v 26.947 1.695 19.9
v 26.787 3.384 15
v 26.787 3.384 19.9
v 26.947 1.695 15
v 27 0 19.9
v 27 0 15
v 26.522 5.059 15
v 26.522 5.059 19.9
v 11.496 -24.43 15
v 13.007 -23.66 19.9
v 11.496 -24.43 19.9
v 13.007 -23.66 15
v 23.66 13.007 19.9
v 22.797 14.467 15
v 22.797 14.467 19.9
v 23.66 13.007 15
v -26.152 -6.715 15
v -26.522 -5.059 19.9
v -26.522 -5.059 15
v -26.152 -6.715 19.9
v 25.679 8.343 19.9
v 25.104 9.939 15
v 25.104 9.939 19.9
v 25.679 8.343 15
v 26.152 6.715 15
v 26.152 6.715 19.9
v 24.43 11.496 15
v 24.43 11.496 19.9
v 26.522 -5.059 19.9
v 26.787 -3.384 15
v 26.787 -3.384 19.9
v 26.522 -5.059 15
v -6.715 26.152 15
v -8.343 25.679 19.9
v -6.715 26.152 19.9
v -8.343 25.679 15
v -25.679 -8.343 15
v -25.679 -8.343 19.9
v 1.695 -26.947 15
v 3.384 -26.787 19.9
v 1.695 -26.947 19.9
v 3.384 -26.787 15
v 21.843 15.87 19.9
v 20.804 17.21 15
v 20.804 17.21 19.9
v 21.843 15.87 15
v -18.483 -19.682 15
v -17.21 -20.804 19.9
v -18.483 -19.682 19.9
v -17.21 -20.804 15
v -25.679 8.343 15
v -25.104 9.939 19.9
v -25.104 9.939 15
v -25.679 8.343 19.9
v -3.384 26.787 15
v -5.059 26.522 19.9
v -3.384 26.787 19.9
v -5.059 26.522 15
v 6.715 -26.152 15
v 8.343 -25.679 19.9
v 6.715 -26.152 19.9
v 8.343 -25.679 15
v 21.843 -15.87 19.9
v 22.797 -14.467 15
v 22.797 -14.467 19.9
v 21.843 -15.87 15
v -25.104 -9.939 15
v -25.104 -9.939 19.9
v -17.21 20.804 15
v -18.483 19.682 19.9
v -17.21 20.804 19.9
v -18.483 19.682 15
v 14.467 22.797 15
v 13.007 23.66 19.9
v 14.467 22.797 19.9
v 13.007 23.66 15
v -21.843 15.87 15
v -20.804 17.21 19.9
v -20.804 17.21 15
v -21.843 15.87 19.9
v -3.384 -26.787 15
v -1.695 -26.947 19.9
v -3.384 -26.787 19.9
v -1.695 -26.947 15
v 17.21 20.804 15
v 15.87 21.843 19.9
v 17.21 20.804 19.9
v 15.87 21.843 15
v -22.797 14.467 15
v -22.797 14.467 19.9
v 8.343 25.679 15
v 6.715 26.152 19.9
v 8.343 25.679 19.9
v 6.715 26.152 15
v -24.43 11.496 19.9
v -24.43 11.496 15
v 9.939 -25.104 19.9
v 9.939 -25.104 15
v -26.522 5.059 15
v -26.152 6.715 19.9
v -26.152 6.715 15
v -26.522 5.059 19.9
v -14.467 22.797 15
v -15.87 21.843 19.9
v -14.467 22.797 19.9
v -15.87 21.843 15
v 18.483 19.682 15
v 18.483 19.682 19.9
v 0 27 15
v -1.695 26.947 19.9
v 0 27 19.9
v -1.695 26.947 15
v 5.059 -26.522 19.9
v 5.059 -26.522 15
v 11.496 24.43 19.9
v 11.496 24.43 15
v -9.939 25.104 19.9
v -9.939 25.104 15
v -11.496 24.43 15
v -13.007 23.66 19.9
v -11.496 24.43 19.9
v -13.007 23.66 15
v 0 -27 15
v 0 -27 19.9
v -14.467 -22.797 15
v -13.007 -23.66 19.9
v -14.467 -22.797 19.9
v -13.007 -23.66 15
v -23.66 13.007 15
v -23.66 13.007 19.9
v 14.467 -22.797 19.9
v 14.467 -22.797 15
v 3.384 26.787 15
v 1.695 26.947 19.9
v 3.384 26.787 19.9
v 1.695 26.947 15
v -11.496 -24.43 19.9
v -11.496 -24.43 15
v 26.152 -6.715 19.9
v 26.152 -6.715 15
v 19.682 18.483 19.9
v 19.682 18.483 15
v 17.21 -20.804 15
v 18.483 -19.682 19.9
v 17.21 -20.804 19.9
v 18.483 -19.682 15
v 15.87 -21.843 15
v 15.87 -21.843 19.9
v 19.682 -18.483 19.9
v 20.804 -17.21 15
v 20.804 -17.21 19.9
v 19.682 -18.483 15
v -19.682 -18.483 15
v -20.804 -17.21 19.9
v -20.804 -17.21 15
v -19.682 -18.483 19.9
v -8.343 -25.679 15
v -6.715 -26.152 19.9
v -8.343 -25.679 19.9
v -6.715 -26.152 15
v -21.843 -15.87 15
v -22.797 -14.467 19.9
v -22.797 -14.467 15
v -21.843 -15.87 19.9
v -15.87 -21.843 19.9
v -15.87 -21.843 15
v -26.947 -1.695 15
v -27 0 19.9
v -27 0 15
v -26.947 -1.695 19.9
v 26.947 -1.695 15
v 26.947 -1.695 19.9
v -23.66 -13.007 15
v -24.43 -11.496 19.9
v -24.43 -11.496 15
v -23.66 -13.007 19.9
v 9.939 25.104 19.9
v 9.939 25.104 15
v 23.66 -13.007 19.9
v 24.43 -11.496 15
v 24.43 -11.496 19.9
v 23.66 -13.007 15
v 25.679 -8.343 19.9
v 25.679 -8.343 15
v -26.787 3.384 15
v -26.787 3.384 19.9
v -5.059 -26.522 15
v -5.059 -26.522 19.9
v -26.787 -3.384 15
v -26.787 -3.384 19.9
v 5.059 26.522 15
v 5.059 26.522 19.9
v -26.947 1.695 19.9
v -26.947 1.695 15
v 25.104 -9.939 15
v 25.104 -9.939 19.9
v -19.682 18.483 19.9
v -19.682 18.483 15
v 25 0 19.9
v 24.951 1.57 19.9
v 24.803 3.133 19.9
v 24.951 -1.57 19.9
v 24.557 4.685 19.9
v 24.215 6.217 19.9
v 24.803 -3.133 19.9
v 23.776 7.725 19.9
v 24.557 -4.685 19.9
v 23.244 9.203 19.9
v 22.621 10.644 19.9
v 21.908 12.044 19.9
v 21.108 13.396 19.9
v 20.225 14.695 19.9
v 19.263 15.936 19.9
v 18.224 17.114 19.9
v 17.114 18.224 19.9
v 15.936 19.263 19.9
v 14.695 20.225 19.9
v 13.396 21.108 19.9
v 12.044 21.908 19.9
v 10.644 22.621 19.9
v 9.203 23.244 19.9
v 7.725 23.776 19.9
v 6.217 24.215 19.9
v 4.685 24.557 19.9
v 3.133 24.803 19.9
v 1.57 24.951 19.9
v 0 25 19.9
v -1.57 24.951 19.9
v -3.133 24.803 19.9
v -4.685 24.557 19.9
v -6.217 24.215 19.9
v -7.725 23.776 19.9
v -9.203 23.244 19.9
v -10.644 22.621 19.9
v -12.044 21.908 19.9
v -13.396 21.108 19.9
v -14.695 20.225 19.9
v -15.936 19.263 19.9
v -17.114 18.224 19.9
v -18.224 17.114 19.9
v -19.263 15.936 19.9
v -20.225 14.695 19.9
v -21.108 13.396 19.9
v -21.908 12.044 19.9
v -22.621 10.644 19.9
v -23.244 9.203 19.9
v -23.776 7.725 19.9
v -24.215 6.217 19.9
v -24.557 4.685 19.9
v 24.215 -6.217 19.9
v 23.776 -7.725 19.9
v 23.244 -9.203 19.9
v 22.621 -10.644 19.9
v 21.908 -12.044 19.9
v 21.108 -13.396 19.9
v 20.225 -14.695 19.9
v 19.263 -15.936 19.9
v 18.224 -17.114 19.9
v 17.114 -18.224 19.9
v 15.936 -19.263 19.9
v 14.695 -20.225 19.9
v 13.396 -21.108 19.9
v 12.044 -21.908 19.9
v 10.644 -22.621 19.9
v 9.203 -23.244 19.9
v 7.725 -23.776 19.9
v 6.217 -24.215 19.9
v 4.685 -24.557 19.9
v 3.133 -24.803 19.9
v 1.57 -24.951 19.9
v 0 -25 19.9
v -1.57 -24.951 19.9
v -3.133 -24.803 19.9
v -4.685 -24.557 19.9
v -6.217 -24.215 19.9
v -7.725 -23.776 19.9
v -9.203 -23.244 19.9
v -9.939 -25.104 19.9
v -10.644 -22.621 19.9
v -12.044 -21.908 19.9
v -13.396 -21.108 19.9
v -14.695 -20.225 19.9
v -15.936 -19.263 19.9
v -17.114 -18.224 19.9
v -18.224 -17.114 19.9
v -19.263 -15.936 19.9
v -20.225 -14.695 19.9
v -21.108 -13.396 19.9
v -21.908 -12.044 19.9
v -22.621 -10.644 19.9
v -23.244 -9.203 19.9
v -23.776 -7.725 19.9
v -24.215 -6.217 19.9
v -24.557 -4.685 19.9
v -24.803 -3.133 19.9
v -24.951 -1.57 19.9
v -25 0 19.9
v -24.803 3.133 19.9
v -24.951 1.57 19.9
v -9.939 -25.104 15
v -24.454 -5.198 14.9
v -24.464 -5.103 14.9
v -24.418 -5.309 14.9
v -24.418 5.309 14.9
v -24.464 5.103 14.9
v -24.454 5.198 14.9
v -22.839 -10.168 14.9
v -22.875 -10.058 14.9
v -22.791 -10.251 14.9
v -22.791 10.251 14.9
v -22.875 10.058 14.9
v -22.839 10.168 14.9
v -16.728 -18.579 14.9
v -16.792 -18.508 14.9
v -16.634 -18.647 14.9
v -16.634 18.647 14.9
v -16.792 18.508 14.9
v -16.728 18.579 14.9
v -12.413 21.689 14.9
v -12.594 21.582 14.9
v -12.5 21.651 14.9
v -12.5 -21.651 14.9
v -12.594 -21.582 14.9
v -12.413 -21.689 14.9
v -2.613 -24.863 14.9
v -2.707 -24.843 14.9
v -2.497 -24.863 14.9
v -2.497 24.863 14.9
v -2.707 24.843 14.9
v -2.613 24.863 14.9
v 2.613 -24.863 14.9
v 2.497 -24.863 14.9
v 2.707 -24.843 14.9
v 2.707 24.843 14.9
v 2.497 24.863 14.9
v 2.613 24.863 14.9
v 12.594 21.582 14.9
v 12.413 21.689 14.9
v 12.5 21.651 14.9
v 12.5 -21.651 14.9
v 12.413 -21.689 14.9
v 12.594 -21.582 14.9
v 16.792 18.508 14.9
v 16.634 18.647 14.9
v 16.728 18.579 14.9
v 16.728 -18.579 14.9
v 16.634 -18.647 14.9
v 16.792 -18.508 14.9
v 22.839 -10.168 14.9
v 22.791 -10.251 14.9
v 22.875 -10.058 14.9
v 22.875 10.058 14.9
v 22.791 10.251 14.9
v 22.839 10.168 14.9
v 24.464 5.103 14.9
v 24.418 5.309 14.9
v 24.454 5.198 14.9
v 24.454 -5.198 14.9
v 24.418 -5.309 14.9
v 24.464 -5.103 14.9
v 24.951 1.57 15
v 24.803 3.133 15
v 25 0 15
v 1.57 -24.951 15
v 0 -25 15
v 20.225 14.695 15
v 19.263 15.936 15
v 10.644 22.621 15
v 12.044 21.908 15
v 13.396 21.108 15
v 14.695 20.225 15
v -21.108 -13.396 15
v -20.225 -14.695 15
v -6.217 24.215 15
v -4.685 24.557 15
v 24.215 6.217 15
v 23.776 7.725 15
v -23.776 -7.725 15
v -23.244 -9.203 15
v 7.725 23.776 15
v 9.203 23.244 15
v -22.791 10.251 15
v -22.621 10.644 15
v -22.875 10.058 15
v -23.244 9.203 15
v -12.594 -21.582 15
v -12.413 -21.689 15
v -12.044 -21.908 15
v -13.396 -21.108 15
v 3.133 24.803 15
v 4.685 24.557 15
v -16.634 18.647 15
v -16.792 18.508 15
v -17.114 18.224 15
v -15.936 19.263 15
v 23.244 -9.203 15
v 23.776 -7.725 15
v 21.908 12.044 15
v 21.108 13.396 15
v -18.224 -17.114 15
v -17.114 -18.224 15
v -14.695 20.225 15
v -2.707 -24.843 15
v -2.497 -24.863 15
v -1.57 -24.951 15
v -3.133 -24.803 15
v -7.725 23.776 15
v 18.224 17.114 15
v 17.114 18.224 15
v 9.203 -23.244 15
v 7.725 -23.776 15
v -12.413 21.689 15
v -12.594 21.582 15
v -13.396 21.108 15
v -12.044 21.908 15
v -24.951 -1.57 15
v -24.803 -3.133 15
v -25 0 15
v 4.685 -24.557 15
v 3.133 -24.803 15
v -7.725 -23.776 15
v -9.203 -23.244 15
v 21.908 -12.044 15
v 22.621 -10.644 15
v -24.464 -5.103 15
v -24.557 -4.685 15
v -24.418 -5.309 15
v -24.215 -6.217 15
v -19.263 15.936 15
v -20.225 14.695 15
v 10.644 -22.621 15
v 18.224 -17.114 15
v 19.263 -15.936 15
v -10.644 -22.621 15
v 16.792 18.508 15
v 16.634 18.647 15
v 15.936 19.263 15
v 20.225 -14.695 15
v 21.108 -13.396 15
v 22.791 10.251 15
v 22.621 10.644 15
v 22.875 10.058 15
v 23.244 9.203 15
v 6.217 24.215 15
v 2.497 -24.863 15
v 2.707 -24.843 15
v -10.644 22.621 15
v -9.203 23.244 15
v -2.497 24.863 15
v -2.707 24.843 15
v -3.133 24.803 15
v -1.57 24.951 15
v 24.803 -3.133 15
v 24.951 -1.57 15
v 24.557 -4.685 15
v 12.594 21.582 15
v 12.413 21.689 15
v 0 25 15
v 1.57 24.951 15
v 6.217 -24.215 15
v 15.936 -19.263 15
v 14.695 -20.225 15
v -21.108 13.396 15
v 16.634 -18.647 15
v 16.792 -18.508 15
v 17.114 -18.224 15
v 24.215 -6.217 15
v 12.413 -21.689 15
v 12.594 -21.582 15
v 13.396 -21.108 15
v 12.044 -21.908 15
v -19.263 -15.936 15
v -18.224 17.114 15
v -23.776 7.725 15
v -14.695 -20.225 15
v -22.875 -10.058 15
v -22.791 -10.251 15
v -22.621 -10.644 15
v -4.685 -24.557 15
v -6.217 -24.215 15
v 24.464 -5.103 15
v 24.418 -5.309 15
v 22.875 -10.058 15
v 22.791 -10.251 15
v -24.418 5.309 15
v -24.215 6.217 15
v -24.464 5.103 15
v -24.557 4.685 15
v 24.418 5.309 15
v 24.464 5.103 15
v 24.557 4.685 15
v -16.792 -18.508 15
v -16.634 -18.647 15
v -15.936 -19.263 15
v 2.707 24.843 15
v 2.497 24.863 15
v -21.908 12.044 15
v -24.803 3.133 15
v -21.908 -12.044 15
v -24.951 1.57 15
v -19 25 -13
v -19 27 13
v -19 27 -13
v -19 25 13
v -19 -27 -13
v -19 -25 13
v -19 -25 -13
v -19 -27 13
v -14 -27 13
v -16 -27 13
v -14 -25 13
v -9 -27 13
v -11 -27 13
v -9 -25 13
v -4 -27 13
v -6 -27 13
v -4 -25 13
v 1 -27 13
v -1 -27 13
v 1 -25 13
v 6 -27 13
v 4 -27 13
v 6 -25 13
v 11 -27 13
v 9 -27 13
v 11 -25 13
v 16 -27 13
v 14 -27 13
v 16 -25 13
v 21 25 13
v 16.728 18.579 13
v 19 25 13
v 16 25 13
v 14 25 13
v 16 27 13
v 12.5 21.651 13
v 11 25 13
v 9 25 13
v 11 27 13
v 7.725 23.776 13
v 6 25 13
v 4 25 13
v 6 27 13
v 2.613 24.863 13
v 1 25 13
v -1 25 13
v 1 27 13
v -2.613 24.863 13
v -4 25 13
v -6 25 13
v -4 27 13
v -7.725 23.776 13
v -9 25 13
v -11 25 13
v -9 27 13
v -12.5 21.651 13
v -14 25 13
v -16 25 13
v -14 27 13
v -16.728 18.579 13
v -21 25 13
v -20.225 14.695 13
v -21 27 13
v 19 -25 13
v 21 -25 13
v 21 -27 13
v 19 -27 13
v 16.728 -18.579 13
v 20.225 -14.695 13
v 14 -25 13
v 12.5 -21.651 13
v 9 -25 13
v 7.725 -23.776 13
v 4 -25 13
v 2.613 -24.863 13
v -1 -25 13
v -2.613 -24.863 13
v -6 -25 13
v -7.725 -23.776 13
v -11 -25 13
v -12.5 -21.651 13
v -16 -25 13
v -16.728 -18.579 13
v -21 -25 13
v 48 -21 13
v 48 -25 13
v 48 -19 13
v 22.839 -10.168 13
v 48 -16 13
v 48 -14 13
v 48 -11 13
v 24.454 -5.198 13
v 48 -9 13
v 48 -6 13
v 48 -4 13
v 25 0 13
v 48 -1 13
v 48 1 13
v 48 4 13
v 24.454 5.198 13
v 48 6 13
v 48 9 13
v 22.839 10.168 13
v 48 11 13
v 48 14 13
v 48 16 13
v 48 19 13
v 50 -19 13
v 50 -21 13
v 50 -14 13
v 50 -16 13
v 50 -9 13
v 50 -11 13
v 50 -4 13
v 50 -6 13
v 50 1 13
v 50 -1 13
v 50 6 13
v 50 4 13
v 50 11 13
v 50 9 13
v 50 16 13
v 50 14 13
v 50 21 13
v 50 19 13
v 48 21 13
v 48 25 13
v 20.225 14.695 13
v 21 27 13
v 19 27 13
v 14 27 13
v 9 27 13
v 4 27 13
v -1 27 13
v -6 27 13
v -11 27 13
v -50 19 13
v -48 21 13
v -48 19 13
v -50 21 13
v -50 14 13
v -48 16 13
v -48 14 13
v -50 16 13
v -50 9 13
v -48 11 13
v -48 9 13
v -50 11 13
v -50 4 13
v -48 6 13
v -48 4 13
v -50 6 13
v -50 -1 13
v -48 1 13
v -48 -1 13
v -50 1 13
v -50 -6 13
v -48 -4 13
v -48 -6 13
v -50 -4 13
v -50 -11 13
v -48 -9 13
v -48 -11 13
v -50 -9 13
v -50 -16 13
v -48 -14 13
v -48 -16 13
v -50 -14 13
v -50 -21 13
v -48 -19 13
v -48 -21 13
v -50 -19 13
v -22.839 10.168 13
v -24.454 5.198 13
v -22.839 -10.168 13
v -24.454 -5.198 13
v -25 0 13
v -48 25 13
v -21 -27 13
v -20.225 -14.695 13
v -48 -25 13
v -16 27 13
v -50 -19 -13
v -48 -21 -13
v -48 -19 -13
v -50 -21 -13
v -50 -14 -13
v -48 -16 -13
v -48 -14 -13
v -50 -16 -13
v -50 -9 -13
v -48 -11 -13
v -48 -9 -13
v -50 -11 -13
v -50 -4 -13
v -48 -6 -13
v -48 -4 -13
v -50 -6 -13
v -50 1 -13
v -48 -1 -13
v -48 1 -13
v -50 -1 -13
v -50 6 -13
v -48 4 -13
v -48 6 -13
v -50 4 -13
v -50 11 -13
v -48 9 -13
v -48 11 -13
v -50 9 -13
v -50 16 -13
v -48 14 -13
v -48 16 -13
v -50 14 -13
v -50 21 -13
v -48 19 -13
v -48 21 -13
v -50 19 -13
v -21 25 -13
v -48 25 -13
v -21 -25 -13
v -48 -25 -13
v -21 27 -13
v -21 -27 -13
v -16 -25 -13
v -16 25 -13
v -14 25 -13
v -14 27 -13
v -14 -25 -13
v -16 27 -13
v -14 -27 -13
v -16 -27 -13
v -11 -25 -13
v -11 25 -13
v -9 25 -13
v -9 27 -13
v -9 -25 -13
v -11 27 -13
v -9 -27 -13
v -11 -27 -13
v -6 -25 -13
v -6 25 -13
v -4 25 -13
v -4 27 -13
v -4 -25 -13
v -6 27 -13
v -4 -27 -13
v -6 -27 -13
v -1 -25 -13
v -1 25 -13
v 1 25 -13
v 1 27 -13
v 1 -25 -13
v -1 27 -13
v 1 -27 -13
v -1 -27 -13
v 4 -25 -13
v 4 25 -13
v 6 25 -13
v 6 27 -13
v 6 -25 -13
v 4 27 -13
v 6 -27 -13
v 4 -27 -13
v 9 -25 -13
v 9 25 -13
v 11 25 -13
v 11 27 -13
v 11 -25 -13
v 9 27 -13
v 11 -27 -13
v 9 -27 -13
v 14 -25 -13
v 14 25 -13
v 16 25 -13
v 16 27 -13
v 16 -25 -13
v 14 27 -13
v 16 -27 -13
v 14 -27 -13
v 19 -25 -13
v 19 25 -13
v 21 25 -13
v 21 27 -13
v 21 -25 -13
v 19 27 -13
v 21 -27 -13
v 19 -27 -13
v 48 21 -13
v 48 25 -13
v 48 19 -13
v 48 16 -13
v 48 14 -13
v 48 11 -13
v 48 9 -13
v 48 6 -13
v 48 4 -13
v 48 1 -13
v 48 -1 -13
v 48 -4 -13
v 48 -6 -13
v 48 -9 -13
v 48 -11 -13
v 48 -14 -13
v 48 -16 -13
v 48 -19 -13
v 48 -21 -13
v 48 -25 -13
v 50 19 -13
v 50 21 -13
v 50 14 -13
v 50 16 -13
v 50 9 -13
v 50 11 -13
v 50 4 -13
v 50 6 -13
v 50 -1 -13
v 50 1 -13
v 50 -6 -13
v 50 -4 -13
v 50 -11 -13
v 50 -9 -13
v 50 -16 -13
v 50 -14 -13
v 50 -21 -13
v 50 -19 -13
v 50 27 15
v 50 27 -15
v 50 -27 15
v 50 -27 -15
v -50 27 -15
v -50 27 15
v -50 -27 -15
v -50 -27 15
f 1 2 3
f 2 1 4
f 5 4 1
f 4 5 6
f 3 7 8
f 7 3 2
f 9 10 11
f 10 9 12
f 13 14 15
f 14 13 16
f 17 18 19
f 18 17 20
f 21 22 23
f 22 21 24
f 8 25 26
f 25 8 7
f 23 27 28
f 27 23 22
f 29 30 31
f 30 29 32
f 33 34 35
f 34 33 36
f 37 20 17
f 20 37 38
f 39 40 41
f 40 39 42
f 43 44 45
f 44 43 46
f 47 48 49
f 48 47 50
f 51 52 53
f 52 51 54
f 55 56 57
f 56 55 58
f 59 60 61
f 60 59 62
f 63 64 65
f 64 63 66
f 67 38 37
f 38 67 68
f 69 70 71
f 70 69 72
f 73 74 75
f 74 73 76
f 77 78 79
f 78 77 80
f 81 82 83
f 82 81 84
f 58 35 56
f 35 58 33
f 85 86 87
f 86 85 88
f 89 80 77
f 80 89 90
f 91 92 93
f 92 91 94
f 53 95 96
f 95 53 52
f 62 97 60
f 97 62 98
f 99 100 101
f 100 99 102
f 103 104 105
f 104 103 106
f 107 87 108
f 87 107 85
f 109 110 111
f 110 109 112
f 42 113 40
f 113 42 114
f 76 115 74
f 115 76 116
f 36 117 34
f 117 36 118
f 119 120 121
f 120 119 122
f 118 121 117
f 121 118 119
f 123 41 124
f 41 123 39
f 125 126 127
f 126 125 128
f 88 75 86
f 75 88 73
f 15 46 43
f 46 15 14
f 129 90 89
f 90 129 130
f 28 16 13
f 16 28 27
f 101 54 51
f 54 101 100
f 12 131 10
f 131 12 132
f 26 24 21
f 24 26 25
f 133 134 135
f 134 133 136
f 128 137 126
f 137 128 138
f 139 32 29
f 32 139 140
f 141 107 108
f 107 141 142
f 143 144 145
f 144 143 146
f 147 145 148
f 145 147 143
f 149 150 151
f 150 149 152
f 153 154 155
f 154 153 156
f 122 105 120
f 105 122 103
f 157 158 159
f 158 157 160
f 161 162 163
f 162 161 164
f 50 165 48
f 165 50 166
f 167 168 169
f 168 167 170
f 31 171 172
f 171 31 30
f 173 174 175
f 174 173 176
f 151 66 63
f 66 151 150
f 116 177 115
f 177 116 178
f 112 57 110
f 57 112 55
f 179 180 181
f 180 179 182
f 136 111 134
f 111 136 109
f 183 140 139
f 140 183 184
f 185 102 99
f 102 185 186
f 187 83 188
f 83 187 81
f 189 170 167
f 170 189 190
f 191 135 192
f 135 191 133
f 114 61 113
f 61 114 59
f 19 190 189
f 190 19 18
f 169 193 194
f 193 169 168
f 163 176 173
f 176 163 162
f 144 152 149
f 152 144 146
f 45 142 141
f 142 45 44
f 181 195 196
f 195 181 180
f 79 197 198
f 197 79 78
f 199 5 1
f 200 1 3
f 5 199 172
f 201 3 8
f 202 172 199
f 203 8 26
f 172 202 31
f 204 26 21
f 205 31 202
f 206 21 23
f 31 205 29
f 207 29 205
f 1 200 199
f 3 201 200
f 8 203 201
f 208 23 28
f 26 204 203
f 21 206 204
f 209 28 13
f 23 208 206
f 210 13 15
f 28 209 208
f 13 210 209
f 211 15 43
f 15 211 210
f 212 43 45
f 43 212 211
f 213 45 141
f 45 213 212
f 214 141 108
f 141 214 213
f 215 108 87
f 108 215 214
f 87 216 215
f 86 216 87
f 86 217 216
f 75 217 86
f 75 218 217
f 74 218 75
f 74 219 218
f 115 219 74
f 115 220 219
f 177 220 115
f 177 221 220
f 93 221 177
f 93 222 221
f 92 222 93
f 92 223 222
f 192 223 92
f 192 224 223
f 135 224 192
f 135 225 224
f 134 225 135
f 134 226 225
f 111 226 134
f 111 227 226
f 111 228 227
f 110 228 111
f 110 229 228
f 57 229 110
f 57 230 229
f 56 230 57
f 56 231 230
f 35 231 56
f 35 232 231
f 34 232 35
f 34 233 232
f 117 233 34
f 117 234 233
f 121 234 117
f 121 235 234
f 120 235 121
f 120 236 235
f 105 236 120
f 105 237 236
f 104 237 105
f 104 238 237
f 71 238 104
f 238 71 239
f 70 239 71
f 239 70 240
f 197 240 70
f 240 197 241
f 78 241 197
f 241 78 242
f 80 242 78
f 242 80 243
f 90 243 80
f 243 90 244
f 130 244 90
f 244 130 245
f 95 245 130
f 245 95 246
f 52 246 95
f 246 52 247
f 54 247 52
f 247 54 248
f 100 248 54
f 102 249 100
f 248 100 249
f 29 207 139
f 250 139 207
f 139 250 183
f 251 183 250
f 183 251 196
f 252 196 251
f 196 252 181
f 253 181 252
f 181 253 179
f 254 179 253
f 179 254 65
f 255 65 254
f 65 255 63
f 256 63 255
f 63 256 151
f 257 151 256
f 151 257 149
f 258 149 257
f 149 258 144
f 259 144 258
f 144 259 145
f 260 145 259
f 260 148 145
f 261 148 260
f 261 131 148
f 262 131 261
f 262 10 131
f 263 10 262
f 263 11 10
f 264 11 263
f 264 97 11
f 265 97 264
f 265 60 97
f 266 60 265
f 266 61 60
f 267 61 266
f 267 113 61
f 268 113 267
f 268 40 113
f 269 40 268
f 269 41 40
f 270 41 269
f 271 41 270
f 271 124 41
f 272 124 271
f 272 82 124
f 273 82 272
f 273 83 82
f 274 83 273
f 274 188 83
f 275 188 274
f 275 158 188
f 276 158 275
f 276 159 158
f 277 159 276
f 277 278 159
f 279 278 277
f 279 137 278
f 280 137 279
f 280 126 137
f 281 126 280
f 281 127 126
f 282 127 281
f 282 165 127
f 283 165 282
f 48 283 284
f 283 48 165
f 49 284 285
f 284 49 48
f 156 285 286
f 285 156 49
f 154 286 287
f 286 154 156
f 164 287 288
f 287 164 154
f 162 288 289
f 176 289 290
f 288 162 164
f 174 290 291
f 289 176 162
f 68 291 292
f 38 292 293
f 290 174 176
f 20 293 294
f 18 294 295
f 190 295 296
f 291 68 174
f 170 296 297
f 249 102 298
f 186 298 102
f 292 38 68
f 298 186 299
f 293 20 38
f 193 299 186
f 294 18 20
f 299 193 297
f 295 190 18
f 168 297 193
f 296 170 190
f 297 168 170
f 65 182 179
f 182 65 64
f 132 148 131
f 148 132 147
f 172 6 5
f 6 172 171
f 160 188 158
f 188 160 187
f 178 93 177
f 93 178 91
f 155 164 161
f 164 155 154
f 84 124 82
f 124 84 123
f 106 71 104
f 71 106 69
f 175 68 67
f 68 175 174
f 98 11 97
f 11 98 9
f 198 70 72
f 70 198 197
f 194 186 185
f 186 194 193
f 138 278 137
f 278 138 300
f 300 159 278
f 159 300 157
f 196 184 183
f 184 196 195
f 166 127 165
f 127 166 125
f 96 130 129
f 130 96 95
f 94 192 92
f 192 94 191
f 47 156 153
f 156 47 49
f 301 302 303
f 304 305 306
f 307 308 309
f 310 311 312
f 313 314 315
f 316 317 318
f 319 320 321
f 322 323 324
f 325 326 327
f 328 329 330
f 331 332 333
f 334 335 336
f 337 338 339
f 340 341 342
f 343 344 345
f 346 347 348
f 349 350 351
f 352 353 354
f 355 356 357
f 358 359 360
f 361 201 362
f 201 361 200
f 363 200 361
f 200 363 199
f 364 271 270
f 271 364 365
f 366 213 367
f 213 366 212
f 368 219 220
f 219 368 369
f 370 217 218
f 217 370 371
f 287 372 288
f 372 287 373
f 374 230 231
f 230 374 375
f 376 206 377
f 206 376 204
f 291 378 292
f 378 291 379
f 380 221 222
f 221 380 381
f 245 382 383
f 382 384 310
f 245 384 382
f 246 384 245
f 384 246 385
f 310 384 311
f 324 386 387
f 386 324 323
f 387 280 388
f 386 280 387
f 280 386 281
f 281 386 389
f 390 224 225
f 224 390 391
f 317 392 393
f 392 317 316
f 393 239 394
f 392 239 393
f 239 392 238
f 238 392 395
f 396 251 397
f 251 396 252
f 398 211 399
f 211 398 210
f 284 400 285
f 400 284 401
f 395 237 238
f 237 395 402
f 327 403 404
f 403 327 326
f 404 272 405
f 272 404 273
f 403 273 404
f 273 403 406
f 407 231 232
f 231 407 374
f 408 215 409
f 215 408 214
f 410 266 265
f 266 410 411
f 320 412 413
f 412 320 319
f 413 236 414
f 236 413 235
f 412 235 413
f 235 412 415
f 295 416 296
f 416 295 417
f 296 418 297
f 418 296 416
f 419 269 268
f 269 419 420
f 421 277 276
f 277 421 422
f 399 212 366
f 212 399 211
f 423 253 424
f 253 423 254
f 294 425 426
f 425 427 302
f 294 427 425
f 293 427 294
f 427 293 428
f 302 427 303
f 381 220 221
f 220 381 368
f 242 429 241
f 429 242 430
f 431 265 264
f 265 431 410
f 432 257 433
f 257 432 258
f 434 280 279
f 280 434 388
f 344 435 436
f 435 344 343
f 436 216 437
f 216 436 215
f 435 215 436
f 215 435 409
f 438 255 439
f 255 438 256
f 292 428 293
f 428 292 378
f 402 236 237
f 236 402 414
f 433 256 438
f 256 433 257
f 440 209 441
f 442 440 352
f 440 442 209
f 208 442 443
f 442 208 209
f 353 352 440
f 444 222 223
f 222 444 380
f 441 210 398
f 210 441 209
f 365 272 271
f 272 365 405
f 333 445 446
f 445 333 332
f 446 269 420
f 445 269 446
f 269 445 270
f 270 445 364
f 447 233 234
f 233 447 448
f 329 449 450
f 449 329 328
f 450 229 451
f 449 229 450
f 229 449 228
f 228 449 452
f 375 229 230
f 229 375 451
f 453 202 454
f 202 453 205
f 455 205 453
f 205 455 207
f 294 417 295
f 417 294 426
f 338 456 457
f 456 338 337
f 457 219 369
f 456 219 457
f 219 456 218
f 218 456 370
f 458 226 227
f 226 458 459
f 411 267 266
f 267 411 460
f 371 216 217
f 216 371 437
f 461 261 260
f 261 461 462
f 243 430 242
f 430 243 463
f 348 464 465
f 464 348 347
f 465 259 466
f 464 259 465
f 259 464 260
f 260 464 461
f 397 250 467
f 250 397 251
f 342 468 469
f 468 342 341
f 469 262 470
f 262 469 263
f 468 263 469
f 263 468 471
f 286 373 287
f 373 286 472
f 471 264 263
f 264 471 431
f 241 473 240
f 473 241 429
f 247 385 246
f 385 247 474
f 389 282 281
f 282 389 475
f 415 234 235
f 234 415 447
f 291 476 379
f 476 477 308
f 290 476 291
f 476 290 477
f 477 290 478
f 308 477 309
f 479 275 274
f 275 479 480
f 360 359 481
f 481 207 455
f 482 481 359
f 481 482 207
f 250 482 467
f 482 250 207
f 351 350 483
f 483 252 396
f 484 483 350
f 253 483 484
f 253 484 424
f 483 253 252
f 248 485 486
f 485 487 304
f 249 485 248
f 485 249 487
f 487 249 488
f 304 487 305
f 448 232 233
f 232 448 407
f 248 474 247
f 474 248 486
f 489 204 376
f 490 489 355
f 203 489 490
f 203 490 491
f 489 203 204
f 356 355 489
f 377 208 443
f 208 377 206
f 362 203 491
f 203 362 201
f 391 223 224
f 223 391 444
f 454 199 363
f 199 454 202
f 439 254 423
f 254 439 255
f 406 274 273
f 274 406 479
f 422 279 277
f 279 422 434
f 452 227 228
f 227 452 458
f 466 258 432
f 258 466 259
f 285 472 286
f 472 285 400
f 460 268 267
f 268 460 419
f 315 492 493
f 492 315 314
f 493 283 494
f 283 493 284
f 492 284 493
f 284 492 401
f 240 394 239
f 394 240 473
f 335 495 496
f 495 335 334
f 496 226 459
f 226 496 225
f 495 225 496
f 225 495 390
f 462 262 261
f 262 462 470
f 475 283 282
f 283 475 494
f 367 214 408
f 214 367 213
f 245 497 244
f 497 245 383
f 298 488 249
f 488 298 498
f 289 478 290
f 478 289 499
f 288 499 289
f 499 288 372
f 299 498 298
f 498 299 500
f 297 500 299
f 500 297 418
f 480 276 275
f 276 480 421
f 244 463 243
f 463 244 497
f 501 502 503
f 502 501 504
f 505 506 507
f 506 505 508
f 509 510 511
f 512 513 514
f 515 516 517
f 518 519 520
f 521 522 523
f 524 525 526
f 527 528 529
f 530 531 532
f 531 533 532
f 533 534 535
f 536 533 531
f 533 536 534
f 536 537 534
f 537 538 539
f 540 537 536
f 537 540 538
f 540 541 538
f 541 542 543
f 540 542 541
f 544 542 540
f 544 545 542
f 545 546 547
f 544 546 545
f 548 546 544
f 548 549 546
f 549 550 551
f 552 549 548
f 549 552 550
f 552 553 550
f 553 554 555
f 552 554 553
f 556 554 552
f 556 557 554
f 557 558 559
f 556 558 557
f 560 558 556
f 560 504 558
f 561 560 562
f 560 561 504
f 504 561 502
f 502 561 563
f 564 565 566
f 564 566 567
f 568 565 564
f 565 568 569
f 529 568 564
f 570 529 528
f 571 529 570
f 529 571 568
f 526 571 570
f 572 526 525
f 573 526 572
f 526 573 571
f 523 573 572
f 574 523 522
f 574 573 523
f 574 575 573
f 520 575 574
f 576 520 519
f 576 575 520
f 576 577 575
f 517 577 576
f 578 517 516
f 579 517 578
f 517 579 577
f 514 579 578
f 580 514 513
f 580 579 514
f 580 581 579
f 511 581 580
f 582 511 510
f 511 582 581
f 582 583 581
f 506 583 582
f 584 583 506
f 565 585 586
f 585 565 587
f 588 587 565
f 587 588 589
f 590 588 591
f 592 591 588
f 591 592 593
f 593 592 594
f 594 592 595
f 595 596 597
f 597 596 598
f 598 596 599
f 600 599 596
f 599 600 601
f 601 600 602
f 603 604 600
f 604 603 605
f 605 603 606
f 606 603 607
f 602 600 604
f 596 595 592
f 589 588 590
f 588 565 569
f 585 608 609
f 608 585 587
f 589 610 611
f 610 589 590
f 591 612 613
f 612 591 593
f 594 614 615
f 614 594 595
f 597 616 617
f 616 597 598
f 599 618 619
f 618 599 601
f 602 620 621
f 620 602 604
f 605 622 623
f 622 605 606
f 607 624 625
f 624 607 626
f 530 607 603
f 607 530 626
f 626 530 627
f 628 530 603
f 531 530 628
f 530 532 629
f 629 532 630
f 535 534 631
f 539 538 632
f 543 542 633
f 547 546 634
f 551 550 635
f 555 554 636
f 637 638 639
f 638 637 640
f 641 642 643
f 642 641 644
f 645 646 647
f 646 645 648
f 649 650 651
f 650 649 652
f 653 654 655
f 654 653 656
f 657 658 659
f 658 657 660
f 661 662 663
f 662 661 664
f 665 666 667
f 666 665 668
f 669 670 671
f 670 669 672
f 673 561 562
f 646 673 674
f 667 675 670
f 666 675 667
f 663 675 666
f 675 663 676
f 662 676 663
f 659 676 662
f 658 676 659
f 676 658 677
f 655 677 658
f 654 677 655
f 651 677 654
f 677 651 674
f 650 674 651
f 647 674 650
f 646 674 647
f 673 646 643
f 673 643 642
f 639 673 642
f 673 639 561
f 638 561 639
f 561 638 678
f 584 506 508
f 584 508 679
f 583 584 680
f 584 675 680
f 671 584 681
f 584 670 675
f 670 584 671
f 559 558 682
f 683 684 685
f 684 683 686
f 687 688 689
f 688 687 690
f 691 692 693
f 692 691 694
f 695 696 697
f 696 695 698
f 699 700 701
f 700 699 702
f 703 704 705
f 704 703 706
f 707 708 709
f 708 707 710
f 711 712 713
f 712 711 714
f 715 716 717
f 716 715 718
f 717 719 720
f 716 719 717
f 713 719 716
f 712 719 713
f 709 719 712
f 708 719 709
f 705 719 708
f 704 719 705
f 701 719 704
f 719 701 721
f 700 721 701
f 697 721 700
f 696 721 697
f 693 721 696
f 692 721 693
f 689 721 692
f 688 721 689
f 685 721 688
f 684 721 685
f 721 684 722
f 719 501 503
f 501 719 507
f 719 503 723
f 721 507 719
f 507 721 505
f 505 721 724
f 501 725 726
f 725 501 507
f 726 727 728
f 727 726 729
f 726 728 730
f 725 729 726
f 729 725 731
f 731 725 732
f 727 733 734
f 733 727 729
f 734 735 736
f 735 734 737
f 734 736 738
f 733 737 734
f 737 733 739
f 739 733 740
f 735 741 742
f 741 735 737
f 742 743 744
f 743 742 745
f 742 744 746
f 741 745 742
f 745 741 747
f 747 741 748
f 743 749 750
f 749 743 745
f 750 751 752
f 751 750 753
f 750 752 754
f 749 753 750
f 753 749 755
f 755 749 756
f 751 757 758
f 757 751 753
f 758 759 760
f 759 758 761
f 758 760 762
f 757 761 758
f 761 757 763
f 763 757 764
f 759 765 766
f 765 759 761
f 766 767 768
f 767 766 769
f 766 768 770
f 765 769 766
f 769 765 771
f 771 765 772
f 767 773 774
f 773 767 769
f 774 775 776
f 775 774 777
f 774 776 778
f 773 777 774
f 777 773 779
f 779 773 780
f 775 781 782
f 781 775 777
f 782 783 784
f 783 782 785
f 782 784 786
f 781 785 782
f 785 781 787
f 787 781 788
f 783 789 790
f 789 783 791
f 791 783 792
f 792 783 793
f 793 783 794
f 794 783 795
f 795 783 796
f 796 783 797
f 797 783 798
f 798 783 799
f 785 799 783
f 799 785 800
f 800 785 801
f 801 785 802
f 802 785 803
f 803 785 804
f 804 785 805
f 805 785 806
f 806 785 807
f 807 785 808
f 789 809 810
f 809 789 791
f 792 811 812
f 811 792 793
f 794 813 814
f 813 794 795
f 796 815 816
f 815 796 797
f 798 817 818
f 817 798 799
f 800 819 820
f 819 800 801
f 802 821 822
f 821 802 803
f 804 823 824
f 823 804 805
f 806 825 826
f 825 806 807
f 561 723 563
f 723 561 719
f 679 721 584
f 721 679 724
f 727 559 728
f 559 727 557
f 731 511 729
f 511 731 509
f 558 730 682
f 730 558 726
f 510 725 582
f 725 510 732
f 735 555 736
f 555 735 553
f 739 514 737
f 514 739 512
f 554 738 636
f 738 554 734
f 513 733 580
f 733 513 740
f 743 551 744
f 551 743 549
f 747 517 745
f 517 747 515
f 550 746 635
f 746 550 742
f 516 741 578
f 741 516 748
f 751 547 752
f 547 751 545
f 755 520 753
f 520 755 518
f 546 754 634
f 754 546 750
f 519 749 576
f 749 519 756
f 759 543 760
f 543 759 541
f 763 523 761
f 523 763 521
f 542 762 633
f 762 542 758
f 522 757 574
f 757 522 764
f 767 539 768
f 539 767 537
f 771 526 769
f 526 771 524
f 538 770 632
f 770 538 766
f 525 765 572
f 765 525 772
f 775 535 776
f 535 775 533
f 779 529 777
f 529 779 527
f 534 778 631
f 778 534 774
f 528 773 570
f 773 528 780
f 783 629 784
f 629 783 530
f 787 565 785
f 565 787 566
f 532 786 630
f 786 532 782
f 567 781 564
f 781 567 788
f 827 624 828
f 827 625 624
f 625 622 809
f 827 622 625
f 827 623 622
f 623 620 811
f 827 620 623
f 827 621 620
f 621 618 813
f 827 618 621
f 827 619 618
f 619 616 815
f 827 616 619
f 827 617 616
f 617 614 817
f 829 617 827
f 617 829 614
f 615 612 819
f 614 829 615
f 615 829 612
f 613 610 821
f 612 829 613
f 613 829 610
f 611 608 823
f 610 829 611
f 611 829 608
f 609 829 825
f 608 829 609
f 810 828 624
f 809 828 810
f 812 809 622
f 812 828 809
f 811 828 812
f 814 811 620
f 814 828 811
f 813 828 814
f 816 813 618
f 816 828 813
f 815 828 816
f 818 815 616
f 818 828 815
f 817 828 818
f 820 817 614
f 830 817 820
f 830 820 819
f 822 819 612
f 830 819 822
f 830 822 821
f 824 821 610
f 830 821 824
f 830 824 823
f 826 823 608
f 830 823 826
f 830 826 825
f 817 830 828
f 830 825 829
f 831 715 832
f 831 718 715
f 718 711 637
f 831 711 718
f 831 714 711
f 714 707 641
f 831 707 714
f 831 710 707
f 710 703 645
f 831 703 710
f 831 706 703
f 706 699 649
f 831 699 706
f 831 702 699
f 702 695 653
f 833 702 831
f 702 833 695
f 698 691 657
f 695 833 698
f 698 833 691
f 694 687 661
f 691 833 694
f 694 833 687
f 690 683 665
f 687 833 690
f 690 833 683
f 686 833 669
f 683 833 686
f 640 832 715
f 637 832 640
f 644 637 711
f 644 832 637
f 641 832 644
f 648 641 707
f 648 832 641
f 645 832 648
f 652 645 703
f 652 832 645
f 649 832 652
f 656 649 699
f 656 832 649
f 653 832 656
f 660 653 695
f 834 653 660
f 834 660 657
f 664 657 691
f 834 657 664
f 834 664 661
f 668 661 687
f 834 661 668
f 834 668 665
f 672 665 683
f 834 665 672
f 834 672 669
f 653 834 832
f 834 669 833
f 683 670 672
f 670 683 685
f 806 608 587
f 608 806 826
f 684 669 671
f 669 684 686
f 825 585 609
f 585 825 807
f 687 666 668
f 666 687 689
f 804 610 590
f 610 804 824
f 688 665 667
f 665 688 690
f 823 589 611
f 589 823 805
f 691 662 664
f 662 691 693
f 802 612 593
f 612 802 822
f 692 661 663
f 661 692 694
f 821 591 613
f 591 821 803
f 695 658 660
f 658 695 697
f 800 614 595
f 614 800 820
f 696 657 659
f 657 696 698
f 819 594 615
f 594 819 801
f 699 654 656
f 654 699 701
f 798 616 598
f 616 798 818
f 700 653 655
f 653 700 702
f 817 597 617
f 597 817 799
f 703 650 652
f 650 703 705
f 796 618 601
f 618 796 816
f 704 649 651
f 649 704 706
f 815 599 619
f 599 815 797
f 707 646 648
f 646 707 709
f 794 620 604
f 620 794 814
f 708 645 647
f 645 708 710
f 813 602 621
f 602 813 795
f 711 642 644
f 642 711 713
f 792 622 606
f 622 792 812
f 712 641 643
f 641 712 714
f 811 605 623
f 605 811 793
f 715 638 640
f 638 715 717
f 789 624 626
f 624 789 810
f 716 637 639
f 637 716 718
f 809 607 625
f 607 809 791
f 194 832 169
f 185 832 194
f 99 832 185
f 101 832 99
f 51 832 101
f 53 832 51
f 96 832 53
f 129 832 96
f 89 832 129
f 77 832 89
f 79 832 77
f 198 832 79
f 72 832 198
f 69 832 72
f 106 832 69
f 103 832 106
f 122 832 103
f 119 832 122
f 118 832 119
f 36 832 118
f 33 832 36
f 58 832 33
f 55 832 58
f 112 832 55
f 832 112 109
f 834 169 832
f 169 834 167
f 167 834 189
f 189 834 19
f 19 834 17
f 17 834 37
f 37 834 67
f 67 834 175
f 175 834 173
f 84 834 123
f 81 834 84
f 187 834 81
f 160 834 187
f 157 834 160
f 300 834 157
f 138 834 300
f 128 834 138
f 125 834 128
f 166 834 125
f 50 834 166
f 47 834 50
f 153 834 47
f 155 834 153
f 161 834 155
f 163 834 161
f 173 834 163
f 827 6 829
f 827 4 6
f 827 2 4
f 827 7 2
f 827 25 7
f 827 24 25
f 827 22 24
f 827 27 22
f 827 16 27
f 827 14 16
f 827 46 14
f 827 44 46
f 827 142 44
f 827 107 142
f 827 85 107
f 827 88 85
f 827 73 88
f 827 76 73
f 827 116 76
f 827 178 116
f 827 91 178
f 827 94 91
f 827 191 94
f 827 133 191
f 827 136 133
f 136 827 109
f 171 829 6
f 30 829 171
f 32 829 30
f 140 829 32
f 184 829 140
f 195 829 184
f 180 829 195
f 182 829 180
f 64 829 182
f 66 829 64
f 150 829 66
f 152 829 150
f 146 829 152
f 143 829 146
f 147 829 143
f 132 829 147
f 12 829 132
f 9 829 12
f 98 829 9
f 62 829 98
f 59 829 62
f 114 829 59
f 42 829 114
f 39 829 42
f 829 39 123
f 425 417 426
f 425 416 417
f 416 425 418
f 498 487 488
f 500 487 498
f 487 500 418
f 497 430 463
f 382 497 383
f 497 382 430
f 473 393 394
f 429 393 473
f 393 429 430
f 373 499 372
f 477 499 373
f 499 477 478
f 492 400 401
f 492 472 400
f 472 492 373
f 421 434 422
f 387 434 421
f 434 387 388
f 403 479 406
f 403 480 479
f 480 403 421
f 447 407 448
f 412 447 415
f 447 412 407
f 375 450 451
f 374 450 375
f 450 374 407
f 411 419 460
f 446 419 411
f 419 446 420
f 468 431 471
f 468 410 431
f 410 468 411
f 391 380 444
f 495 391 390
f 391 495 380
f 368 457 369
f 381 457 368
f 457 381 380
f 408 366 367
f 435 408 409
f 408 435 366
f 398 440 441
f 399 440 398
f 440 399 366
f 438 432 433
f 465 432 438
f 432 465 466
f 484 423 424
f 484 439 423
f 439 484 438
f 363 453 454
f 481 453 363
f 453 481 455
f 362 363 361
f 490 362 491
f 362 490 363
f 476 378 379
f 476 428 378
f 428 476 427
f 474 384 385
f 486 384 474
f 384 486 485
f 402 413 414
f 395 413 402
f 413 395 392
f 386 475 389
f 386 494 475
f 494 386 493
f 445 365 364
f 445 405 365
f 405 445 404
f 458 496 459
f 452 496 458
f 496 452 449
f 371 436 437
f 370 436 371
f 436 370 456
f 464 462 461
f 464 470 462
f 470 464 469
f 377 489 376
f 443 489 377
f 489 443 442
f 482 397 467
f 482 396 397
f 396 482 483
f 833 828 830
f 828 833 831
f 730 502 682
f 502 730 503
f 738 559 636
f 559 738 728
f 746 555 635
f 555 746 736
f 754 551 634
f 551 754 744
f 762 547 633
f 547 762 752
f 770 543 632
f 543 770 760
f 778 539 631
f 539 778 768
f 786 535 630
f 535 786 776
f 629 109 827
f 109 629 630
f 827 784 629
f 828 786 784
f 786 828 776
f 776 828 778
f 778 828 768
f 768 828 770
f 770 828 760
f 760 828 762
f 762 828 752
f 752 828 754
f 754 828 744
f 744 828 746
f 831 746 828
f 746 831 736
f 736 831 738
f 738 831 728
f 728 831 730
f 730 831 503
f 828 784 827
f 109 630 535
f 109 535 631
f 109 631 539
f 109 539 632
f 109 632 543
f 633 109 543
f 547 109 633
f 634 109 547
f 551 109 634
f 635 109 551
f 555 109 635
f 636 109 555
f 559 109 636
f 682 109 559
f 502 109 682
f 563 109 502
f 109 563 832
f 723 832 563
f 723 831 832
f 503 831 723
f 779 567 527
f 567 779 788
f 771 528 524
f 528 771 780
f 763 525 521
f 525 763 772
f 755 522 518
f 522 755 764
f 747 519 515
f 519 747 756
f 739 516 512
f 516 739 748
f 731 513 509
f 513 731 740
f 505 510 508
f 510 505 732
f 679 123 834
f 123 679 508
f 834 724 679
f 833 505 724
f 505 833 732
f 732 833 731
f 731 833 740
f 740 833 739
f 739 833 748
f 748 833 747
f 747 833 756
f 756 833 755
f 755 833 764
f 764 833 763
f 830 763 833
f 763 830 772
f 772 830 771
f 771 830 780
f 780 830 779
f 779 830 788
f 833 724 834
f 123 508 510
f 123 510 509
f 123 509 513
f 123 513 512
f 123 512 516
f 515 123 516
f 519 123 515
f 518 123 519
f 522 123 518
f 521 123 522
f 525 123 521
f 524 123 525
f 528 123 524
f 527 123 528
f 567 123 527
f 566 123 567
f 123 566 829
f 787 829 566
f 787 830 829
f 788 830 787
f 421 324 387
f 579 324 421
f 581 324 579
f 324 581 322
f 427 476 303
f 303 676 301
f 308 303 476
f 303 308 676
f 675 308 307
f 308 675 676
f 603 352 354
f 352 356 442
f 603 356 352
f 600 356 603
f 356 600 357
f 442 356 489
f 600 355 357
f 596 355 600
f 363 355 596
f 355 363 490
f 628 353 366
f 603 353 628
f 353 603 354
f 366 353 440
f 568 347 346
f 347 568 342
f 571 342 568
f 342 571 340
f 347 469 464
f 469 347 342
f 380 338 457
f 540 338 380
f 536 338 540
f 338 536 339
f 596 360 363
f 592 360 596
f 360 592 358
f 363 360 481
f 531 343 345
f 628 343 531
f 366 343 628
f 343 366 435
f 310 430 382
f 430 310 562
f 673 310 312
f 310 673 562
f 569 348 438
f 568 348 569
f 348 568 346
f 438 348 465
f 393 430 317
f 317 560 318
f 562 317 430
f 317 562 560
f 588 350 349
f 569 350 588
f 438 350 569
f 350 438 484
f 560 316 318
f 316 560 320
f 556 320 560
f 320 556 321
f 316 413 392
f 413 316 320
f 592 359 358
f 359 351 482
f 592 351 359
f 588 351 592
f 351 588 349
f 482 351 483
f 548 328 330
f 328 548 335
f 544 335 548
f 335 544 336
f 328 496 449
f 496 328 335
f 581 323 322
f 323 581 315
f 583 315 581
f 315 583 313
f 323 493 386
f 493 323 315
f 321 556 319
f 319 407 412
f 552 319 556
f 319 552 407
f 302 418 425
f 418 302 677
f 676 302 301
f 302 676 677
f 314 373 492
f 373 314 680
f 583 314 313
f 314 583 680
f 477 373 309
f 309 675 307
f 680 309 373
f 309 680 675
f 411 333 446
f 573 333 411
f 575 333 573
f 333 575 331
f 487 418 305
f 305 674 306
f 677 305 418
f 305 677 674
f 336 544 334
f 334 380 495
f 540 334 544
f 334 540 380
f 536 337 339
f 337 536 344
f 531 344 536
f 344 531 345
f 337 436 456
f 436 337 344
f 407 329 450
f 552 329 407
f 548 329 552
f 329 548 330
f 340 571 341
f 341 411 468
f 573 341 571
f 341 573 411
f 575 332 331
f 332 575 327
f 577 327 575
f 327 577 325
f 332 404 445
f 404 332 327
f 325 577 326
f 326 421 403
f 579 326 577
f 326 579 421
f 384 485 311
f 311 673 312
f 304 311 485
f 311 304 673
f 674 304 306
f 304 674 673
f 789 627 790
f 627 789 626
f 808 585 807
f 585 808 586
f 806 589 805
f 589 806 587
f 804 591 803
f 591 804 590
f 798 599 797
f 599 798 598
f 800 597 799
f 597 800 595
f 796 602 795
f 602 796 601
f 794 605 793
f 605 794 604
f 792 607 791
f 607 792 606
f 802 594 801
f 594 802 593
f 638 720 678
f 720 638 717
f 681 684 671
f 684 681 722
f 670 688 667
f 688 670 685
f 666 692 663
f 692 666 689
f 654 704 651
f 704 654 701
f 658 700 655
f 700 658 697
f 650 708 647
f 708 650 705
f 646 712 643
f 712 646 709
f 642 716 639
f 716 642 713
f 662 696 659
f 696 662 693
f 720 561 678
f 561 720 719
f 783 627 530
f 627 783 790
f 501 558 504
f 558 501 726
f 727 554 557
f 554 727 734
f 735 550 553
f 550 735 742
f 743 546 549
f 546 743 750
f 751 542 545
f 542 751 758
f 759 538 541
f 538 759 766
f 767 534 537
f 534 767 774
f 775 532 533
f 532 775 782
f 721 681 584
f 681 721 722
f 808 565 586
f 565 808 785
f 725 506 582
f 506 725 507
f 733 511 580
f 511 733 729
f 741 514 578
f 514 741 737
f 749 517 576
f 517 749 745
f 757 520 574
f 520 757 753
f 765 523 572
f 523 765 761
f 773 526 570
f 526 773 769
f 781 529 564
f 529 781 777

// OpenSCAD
// file: ../../../../shapes/open-cylinder/open-cylinder.scad
// TODO: Lower this to 50.
module openCylinder(height = 3,
                    outerRadius = 7,
                    innerRadius = 4.5,
                    fn = 100)
{
    $fn = fn;

    difference()
    {
        cylinder(r=outerRadius,
                 h=height);

        translate([0, 0, -1])
        cylinder(r=innerRadius,
                 h=height+1.01);
    }
}
// file: ../../water-pump-filter.scad
use <../../shapes/open-cylinder/open-cylinder.scad>

module waterPumpFilter(baseHeight = 30,
					   innerRadius = 25,
					   xLength = 54)
{
	union()
	{
		zTranslate = baseHeight / 2.0;
		translate([0,0, zTranslate-0.1])
		waterPumpFilter_connector(innerRadius = innerRadius);


		xyLength = (innerRadius * 2) + 4;
		waterPumpFilter_base(height = baseHeight,
							 innerRadius = innerRadius,
							 xLength = xLength,
							 yLength = xyLength);
	}
}

module waterPumpFilter_connector(innerRadius)
{
	openCylinder(height = 5,
				 innerRadius = innerRadius,
				 outerRadius = innerRadius + 2);
}

module waterPumpFilter_base(height,
														innerRadius,
														xLength,
														yLength)
{
	difference()
	{
		// this is the outer cube
		cube([xLength, yLength, height], center = true);

		color("pink")
		translate([0,0,10])
		cylinder(r=innerRadius, h=30, center=true);

		innerCubeDifference = 4;
		color("green")
		waterPumpFilter_base_innerCube(xLength - innerCubeDifference,
									   yLength - innerCubeDifference,
									   height - innerCubeDifference);

		cutoutHeight = height - 4;

		waterPumpFilter_xCutouts(height = cutoutHeight);

		waterPumpFilter_yCutouts(height = cutoutHeight);
	}
}

module waterPumpFilter_base_innerCube(xyLength, yLength, height)
{
	cube([xyLength, yLength, height], center = true);
}

module waterPumpFilter_xCutouts(height)
{
	step = 5;

	for(x = [-20 : step : 20])
	{
		translate([x, 0, 0])
		cube([2, 100, height], center = true);
	}
}

module waterPumpFilter_yCutouts(height)
{
	step = 5;

	for(y = [-20 : step : 20])
	{
		translate([0, y, 0])
		cube([100, 2, height], center = true);
	}
}
// main file
use <../../water-pump-filter.scad>

waterPumpFilter(xLength = 100);
